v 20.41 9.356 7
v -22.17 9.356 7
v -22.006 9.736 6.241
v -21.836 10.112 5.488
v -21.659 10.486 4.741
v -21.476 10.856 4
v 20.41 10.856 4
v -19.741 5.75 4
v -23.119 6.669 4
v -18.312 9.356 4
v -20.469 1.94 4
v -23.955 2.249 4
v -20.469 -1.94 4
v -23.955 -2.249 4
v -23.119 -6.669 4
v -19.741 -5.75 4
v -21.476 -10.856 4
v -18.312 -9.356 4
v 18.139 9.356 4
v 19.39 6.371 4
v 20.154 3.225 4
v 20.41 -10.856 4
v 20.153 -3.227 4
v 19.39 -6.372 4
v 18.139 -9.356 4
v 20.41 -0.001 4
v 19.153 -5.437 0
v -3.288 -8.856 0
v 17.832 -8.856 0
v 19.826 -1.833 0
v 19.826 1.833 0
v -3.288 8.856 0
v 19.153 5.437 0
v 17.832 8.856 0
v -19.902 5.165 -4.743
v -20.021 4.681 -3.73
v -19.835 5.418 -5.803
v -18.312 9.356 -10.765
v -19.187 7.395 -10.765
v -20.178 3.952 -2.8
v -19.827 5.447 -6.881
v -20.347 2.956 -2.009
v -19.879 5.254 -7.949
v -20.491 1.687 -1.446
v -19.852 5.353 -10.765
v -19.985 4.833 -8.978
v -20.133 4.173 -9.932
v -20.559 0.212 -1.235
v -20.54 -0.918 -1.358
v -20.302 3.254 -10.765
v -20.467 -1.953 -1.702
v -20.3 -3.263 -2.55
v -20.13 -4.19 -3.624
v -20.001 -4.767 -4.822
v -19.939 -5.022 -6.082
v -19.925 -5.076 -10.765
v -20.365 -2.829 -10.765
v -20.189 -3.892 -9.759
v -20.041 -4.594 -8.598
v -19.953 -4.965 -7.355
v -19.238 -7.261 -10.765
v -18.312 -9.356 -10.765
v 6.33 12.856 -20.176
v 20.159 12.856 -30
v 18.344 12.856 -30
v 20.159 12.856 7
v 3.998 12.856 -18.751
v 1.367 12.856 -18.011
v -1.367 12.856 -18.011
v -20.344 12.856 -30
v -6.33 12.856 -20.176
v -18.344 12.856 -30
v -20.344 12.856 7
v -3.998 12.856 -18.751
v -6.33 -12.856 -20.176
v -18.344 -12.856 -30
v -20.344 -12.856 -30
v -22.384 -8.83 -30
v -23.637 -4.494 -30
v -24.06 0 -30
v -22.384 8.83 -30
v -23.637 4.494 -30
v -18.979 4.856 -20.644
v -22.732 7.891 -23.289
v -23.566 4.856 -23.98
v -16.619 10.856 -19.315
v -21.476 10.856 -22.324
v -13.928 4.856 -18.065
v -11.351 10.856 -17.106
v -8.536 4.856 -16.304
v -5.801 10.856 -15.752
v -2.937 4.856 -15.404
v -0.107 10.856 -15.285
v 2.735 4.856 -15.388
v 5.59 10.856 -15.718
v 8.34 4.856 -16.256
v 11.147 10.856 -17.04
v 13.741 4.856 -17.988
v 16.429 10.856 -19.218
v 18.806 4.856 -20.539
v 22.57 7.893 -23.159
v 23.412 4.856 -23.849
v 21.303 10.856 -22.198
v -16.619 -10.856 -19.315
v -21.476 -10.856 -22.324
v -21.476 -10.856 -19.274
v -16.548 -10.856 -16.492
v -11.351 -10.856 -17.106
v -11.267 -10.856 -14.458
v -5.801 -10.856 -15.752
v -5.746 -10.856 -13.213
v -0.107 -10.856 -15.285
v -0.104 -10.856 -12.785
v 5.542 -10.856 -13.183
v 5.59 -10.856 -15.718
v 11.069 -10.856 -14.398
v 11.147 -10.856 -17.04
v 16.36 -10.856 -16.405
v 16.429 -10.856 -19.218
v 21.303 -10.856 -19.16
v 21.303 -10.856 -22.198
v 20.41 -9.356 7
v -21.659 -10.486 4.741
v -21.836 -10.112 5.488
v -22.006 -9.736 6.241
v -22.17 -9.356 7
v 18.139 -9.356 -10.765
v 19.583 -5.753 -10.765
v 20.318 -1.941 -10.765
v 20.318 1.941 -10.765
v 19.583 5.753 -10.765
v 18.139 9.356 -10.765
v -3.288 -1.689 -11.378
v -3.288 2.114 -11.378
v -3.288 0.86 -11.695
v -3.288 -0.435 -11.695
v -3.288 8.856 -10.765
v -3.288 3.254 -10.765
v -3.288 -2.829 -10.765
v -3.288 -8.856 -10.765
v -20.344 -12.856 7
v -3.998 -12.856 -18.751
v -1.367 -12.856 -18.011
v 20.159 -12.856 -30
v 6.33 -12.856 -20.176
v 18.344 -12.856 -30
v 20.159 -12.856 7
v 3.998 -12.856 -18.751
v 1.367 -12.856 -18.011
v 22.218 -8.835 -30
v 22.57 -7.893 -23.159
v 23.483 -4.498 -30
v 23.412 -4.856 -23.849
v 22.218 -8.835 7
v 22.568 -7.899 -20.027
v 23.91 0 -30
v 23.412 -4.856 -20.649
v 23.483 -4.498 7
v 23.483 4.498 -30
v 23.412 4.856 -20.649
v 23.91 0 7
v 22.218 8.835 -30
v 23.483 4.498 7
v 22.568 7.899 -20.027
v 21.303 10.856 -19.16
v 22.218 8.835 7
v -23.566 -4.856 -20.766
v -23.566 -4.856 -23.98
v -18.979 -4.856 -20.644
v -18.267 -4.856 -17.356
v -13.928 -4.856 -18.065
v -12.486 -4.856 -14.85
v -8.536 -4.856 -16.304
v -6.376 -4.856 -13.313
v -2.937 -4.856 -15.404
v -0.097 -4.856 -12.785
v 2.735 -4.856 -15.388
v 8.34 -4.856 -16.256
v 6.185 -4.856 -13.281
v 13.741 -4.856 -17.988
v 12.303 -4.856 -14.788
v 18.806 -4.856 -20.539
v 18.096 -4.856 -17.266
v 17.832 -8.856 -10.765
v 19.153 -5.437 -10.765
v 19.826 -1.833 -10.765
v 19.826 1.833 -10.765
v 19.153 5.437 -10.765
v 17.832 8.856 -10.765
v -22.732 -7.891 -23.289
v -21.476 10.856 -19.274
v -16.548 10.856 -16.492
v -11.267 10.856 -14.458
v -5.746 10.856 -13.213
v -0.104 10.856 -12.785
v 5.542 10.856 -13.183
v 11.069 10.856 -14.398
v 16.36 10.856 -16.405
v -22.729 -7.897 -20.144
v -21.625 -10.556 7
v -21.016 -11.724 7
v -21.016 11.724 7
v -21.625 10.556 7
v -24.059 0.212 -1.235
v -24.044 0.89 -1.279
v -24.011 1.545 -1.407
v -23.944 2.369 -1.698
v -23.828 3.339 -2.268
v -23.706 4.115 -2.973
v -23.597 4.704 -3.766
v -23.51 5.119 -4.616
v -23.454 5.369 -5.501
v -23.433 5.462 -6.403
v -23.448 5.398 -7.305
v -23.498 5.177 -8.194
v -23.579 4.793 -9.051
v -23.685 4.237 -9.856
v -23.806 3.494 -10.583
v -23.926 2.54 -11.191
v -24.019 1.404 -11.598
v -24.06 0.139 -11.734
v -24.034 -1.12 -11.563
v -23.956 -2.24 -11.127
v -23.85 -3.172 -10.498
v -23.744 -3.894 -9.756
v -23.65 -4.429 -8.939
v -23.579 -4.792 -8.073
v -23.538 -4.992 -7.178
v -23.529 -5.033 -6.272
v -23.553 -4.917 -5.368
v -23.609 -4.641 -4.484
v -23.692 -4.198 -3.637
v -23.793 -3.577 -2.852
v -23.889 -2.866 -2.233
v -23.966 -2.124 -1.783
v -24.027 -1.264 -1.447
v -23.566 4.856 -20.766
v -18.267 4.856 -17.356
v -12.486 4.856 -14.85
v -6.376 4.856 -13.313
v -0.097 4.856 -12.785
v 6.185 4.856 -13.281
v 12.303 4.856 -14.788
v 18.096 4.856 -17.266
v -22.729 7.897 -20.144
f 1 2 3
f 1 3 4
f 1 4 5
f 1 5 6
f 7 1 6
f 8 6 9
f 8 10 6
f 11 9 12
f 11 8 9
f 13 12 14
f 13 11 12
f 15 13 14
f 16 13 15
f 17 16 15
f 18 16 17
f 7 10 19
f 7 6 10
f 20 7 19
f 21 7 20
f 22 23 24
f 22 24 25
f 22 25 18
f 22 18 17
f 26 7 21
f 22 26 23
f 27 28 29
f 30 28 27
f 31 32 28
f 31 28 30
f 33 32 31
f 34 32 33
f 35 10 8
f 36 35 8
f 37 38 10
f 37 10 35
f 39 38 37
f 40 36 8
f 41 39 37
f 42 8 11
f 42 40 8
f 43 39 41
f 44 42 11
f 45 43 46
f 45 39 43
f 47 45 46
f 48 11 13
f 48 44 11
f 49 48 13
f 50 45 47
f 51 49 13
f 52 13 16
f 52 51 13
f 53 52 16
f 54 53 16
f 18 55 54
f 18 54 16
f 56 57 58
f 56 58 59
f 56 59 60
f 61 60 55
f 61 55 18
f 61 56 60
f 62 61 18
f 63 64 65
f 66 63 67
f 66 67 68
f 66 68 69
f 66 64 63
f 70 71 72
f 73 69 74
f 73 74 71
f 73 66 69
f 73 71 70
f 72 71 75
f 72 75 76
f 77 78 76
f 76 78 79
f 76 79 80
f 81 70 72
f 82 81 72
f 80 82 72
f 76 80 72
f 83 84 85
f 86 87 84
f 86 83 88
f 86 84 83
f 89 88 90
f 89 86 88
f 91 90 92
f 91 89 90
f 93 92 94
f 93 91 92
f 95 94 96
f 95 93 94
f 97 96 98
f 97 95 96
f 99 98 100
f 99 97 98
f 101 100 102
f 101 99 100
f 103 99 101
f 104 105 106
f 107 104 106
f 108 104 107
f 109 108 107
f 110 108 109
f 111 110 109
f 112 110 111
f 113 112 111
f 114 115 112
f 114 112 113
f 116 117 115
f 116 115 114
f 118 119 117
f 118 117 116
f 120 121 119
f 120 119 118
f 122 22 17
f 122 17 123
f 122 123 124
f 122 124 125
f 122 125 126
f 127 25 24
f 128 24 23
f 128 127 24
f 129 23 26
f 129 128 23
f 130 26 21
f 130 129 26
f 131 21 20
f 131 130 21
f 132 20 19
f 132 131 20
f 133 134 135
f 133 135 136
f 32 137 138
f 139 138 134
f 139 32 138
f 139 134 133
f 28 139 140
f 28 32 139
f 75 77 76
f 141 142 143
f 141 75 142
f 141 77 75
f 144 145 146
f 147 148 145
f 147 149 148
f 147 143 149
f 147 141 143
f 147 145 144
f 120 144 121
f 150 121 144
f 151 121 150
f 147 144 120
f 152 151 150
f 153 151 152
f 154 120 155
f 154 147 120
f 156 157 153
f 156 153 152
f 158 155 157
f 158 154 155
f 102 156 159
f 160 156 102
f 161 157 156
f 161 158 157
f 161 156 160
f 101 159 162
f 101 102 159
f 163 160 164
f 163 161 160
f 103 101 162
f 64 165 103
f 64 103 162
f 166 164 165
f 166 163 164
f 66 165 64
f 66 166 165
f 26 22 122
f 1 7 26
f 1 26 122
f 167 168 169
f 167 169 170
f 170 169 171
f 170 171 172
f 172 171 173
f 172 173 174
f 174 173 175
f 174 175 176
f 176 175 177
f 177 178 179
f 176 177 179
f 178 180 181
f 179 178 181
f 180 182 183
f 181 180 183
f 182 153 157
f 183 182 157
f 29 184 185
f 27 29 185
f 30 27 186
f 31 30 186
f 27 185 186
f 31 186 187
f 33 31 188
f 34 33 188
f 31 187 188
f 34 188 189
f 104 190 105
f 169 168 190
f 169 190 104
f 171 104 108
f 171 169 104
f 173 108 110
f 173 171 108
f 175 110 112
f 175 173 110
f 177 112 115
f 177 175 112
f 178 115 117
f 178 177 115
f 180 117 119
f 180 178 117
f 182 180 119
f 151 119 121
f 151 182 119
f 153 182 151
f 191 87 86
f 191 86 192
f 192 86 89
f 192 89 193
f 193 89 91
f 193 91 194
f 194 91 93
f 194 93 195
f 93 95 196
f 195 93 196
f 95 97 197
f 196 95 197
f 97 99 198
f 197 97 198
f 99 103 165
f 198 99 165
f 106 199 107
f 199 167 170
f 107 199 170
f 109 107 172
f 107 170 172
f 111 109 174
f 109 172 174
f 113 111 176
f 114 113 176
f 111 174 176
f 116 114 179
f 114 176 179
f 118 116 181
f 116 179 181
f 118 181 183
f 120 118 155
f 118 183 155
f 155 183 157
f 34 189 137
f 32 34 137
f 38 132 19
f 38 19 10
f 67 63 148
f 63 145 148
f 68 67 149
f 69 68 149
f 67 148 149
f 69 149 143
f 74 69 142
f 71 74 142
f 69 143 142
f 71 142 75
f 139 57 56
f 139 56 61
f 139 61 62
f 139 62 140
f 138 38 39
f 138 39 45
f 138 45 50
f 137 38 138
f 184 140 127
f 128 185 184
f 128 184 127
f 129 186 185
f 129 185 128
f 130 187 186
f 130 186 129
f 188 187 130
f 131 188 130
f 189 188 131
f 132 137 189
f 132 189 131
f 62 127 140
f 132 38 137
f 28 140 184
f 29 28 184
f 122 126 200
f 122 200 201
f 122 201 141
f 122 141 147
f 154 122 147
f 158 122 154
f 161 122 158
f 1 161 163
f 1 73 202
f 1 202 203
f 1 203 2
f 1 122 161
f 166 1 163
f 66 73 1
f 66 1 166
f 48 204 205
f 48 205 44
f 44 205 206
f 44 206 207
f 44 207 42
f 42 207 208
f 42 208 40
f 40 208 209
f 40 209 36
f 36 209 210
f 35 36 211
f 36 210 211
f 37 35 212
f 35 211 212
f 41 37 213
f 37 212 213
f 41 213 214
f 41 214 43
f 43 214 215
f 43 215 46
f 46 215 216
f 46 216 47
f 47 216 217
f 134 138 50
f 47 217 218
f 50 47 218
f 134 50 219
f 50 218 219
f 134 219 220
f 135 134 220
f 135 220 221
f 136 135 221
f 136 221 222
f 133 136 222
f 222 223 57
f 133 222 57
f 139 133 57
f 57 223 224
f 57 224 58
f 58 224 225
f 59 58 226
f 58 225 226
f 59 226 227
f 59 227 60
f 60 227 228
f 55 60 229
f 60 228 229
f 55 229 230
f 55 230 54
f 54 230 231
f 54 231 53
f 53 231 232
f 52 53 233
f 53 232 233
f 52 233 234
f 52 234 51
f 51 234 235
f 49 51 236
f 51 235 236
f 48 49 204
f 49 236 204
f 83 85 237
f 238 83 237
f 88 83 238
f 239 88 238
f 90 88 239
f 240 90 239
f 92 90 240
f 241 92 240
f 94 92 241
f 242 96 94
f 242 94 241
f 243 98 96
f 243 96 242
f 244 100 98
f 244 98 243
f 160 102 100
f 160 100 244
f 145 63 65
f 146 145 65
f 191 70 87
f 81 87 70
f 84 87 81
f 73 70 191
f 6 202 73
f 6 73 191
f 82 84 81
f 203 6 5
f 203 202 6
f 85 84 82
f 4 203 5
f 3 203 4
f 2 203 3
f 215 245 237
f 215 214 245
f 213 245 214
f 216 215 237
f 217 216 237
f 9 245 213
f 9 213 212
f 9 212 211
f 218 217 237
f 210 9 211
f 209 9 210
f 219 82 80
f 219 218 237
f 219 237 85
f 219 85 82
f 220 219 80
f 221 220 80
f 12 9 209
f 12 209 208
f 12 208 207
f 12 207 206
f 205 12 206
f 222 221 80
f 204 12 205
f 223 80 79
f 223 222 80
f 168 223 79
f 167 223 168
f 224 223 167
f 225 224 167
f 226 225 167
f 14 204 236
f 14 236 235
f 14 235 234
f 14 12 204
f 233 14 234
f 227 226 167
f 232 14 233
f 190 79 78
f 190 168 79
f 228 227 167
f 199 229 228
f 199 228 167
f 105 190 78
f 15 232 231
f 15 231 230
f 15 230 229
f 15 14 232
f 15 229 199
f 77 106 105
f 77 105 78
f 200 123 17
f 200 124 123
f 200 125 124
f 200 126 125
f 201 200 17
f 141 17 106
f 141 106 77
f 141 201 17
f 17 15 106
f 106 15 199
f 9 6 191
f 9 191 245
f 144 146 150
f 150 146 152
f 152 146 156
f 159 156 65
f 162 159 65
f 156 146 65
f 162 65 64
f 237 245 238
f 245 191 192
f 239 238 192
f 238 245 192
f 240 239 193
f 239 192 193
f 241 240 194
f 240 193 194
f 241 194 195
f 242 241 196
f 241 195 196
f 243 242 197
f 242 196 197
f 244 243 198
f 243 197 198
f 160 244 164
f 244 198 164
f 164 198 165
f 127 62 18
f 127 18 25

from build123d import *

# Parameters (mm, degrees)
BOSS_EXTRUDE2_DEPTH      = 7
BOSS_EXTRUDE2_DEPTH_BACK = 30
CUT_EXTRUDE1_DEPTH       = 25.712971991
FILLET1_R                = 10
CUT_EXTRUDE2_START       = -17.764514
CUT_EXTRUDE2_DEPTH       = 17.764514
BOSS_EXTRUDE3_DEPTH      = 10.764514
CUT_EXTRUDE3_REACH       = 60.021
SKETCH11_R               = 5.25
SKETCH12_W               = 2.5
SKETCH12_H               = 6
CUT_EXTRUDE10_START      = -44.470309
CUT_EXTRUDE10_DEPTH      = 44.470309


with BuildPart() as part:
    # Sketch7 → Boss-Extrude2 (new, two sides)
    with BuildSketch(Plane.XY) as boss_extrude2_sk:
        with BuildLine():
            Line((-20.343909144, -12.856485995), (20.159427524, -12.856485995))
            ThreePointArc((20.159427524, -12.856485995), (23.910076333, 0), (20.159427524, 12.856485995))
            Line((20.159427524, 12.856485995), (-20.343909144, 12.856485995))
            ThreePointArc((-20.343909144, 12.856485995), (-24.06023272, 0), (-20.343909144, -12.856485995))
        make_face()
    extrude(amount=BOSS_EXTRUDE2_DEPTH)
    extrude(boss_extrude2_sk.sketch, amount=-BOSS_EXTRUDE2_DEPTH_BACK)

    # Sketch8 → Cut-Extrude1 (cut)
    with BuildSketch(Plane(origin=(0, 12.856485995, 0), x_dir=(1, 0, 0), z_dir=(0, 1, 0))):
        Polygon((-18.343909144, 30), (0, 30), (0, 15), align=None)
    cut_extrude1 = extrude(amount=-CUT_EXTRUDE1_DEPTH, mode=Mode.SUBTRACT)

    # Mirror1: Cut-Extrude1 across plane
    add(cut_extrude1.mirror(Plane(origin=(0, 0, 0), x_dir=(0, 0, 1), z_dir=(1, 0, 0))), mode=Mode.SUBTRACT)

    # Fillet1
    fillet1_edges = [part.edges().sort_by_distance(p)[0] for p in [
        (0, 0, -15),
    ]]
    fillet(fillet1_edges, radius=FILLET1_R)

    # Sketch9 → Cut-Extrude2 (cut)
    with BuildSketch(Plane.XY.offset(7).offset(CUT_EXTRUDE2_START)):
        with BuildLine():
            Line((-18.312348097, -9.356485995), (18.139112044, -9.356485995))
            ThreePointArc((18.139112044, -9.356485995), (20.410076333, 0), (18.139112044, 9.356485995))
            Line((18.139112044, 9.356485995), (-18.312348097, 9.356485995))
            ThreePointArc((-18.312348097, 9.356485995), (-20.56023272, 0), (-18.312348097, -9.356485995))
        make_face()
    extrude(amount=CUT_EXTRUDE2_DEPTH, mode=Mode.SUBTRACT)


with BuildPart() as boss_extrude3_tool:
    # Sketch10 → Boss-Extrude3 (new body)
    with BuildSketch(Plane(origin=(0, 0, -10.764513537), x_dir=(-1, 0, 0), z_dir=(0, 0, -1))):
        with BuildLine():
            Line((3.288113076, 8.856485995), (3.288113076, -8.856485995))
            Line((3.288113076, -8.856485995), (-17.831819744, -8.856485995))
            ThreePointArc((-17.831819744, -8.856485995), (-19.910076333, 0), (-17.831819744, 8.856485995))
            Line((-17.831819744, 8.856485995), (3.288113076, 8.856485995))
        make_face()
    extrude(amount=-BOSS_EXTRUDE3_DEPTH)


with BuildPart() as part_1:
    add(part.part)


with BuildPart() as part_2:
    # Boss-Extrude3: joined with boss_extrude3_tool
    add(part_1.part.fuse(boss_extrude3_tool.part, tol=0.00001))

    # Cut-Extrude3: up to this face of the body (flat: up to its plane)
    cut_extrude3_end = Plane(part_2.part.faces().sort_by_distance((-3.288113076, 0, -5.382256537))[0])
    # Sketch11 → Cut-Extrude3 (cut, up to the picked face)
    with BuildSketch(Plane.ZY.offset(24.06023272), mode=Mode.PRIVATE) as cut_extrude3_sk1:
        with Locations((-6.485, 0.212445037)):
            Circle(SKETCH11_R)
    cut_extrude3_tool1 = split(extrude(cut_extrude3_sk1.sketch, amount=-CUT_EXTRUDE3_REACH, mode=Mode.PRIVATE), bisect_by=cut_extrude3_end, keep=Keep.BOTH, mode=Mode.PRIVATE)
    add(cut_extrude3_tool1.solids().sort_by(Axis((-24.060233, 0.212445, -6.485), (1, 0, 0)))[0], mode=Mode.SUBTRACT)

    # Sketch12 → Cut-Revolve1 (revolve, cut)
    with BuildSketch(Plane(origin=(0, 0, 0), x_dir=(0, 0, -1), z_dir=(1, 0, 0))):
        with Locations((14.035, 7.856485995)):
            Rectangle(SKETCH12_W, SKETCH12_H)
        with Locations((14.035, -7.856485995)):
            Rectangle(SKETCH12_W, SKETCH12_H)
    revolve(axis=Axis((0, -85.887973373, -51.567605329), (0, 1, 0)), mode=Mode.SUBTRACT)

    # Sketch14 → Cut-Extrude10 (cut)
    with BuildSketch(Plane.ZY.offset(24.06023272).offset(CUT_EXTRUDE10_START)):
        Polygon((7, 9.356485995), (4, 10.856485995), (4, -10.856485995), (7, -9.356485995), align=None)
    extrude(amount=CUT_EXTRUDE10_DEPTH, mode=Mode.SUBTRACT)


solid = part_2.part
